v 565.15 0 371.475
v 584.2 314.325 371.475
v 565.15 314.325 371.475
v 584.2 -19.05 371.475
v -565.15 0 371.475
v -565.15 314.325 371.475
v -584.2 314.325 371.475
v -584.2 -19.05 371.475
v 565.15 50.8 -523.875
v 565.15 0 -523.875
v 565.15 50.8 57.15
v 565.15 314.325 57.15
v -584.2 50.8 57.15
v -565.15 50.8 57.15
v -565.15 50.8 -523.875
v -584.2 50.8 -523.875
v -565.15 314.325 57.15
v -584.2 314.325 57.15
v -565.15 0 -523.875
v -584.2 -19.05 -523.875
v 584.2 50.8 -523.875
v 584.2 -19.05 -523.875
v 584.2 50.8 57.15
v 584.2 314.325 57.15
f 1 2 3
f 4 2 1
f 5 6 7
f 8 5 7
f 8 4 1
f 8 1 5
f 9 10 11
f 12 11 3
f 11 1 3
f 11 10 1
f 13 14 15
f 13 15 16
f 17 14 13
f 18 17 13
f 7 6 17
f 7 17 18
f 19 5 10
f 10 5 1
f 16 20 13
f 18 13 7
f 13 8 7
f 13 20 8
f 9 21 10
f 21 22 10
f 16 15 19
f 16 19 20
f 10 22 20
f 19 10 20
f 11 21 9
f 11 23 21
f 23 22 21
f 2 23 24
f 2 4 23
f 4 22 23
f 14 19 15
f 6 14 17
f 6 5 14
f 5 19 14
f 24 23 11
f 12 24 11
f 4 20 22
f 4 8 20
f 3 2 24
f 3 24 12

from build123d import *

# Parameters (mm, degrees)
F0_W     = 1168.4
F0_H     = 742.95
F1_DEPTH = 19.05
F2_W     = 19.05
F2_H     = 742.95
F3_DEPTH = 50.8
F4_W     = 19.05
F4_H     = 314.325
F5_DEPTH = 263.525
F6_W     = 19.05
F6_H     = 314.325
F7_DEPTH = 263.525
F8_DEPTH = 152.4


with BuildPart() as f1:
    # F0 (on Front) → F1 (new body)
    with BuildSketch(Plane.XZ):
        Rectangle(F0_W, F0_H)
    extrude(amount=F1_DEPTH)

    # F2 (on face) → F3 (join)
    with BuildSketch(Plane(origin=(0, 0, 0), x_dir=(-1, 0, 0), z_dir=(0, 1, 0))):
        with Locations((-574.675, 0)):
            Rectangle(F2_W, F2_H)
        with Locations((574.675, 0)):
            Rectangle(F2_W, F2_H)
    extrude(amount=F3_DEPTH)

    # F4 (on face) → F5 (join)
    with BuildSketch(Plane(origin=(0, 50.8, 0), x_dir=(-1, 0, 0), z_dir=(0, 1, 0))):
        with Locations((-574.675, 214.3125)):
            Rectangle(F4_W, F4_H)
    extrude(amount=F5_DEPTH)

    # F6 (on face) → F7 (join)
    with BuildSketch(Plane(origin=(0, 50.8, 0), x_dir=(-1, 0, 0), z_dir=(0, 1, 0))):
        with Locations((574.675, 214.3125)):
            Rectangle(F6_W, F6_H)
    extrude(amount=F7_DEPTH)

    # F8 (add): a face of the model
    f8_faces = [f1.faces().sort_by_distance(p)[0] for p in [
        (0, -6.731, -371.475),
    ]]
    extrude(f8_faces, amount=F8_DEPTH)


solid = f1.part
